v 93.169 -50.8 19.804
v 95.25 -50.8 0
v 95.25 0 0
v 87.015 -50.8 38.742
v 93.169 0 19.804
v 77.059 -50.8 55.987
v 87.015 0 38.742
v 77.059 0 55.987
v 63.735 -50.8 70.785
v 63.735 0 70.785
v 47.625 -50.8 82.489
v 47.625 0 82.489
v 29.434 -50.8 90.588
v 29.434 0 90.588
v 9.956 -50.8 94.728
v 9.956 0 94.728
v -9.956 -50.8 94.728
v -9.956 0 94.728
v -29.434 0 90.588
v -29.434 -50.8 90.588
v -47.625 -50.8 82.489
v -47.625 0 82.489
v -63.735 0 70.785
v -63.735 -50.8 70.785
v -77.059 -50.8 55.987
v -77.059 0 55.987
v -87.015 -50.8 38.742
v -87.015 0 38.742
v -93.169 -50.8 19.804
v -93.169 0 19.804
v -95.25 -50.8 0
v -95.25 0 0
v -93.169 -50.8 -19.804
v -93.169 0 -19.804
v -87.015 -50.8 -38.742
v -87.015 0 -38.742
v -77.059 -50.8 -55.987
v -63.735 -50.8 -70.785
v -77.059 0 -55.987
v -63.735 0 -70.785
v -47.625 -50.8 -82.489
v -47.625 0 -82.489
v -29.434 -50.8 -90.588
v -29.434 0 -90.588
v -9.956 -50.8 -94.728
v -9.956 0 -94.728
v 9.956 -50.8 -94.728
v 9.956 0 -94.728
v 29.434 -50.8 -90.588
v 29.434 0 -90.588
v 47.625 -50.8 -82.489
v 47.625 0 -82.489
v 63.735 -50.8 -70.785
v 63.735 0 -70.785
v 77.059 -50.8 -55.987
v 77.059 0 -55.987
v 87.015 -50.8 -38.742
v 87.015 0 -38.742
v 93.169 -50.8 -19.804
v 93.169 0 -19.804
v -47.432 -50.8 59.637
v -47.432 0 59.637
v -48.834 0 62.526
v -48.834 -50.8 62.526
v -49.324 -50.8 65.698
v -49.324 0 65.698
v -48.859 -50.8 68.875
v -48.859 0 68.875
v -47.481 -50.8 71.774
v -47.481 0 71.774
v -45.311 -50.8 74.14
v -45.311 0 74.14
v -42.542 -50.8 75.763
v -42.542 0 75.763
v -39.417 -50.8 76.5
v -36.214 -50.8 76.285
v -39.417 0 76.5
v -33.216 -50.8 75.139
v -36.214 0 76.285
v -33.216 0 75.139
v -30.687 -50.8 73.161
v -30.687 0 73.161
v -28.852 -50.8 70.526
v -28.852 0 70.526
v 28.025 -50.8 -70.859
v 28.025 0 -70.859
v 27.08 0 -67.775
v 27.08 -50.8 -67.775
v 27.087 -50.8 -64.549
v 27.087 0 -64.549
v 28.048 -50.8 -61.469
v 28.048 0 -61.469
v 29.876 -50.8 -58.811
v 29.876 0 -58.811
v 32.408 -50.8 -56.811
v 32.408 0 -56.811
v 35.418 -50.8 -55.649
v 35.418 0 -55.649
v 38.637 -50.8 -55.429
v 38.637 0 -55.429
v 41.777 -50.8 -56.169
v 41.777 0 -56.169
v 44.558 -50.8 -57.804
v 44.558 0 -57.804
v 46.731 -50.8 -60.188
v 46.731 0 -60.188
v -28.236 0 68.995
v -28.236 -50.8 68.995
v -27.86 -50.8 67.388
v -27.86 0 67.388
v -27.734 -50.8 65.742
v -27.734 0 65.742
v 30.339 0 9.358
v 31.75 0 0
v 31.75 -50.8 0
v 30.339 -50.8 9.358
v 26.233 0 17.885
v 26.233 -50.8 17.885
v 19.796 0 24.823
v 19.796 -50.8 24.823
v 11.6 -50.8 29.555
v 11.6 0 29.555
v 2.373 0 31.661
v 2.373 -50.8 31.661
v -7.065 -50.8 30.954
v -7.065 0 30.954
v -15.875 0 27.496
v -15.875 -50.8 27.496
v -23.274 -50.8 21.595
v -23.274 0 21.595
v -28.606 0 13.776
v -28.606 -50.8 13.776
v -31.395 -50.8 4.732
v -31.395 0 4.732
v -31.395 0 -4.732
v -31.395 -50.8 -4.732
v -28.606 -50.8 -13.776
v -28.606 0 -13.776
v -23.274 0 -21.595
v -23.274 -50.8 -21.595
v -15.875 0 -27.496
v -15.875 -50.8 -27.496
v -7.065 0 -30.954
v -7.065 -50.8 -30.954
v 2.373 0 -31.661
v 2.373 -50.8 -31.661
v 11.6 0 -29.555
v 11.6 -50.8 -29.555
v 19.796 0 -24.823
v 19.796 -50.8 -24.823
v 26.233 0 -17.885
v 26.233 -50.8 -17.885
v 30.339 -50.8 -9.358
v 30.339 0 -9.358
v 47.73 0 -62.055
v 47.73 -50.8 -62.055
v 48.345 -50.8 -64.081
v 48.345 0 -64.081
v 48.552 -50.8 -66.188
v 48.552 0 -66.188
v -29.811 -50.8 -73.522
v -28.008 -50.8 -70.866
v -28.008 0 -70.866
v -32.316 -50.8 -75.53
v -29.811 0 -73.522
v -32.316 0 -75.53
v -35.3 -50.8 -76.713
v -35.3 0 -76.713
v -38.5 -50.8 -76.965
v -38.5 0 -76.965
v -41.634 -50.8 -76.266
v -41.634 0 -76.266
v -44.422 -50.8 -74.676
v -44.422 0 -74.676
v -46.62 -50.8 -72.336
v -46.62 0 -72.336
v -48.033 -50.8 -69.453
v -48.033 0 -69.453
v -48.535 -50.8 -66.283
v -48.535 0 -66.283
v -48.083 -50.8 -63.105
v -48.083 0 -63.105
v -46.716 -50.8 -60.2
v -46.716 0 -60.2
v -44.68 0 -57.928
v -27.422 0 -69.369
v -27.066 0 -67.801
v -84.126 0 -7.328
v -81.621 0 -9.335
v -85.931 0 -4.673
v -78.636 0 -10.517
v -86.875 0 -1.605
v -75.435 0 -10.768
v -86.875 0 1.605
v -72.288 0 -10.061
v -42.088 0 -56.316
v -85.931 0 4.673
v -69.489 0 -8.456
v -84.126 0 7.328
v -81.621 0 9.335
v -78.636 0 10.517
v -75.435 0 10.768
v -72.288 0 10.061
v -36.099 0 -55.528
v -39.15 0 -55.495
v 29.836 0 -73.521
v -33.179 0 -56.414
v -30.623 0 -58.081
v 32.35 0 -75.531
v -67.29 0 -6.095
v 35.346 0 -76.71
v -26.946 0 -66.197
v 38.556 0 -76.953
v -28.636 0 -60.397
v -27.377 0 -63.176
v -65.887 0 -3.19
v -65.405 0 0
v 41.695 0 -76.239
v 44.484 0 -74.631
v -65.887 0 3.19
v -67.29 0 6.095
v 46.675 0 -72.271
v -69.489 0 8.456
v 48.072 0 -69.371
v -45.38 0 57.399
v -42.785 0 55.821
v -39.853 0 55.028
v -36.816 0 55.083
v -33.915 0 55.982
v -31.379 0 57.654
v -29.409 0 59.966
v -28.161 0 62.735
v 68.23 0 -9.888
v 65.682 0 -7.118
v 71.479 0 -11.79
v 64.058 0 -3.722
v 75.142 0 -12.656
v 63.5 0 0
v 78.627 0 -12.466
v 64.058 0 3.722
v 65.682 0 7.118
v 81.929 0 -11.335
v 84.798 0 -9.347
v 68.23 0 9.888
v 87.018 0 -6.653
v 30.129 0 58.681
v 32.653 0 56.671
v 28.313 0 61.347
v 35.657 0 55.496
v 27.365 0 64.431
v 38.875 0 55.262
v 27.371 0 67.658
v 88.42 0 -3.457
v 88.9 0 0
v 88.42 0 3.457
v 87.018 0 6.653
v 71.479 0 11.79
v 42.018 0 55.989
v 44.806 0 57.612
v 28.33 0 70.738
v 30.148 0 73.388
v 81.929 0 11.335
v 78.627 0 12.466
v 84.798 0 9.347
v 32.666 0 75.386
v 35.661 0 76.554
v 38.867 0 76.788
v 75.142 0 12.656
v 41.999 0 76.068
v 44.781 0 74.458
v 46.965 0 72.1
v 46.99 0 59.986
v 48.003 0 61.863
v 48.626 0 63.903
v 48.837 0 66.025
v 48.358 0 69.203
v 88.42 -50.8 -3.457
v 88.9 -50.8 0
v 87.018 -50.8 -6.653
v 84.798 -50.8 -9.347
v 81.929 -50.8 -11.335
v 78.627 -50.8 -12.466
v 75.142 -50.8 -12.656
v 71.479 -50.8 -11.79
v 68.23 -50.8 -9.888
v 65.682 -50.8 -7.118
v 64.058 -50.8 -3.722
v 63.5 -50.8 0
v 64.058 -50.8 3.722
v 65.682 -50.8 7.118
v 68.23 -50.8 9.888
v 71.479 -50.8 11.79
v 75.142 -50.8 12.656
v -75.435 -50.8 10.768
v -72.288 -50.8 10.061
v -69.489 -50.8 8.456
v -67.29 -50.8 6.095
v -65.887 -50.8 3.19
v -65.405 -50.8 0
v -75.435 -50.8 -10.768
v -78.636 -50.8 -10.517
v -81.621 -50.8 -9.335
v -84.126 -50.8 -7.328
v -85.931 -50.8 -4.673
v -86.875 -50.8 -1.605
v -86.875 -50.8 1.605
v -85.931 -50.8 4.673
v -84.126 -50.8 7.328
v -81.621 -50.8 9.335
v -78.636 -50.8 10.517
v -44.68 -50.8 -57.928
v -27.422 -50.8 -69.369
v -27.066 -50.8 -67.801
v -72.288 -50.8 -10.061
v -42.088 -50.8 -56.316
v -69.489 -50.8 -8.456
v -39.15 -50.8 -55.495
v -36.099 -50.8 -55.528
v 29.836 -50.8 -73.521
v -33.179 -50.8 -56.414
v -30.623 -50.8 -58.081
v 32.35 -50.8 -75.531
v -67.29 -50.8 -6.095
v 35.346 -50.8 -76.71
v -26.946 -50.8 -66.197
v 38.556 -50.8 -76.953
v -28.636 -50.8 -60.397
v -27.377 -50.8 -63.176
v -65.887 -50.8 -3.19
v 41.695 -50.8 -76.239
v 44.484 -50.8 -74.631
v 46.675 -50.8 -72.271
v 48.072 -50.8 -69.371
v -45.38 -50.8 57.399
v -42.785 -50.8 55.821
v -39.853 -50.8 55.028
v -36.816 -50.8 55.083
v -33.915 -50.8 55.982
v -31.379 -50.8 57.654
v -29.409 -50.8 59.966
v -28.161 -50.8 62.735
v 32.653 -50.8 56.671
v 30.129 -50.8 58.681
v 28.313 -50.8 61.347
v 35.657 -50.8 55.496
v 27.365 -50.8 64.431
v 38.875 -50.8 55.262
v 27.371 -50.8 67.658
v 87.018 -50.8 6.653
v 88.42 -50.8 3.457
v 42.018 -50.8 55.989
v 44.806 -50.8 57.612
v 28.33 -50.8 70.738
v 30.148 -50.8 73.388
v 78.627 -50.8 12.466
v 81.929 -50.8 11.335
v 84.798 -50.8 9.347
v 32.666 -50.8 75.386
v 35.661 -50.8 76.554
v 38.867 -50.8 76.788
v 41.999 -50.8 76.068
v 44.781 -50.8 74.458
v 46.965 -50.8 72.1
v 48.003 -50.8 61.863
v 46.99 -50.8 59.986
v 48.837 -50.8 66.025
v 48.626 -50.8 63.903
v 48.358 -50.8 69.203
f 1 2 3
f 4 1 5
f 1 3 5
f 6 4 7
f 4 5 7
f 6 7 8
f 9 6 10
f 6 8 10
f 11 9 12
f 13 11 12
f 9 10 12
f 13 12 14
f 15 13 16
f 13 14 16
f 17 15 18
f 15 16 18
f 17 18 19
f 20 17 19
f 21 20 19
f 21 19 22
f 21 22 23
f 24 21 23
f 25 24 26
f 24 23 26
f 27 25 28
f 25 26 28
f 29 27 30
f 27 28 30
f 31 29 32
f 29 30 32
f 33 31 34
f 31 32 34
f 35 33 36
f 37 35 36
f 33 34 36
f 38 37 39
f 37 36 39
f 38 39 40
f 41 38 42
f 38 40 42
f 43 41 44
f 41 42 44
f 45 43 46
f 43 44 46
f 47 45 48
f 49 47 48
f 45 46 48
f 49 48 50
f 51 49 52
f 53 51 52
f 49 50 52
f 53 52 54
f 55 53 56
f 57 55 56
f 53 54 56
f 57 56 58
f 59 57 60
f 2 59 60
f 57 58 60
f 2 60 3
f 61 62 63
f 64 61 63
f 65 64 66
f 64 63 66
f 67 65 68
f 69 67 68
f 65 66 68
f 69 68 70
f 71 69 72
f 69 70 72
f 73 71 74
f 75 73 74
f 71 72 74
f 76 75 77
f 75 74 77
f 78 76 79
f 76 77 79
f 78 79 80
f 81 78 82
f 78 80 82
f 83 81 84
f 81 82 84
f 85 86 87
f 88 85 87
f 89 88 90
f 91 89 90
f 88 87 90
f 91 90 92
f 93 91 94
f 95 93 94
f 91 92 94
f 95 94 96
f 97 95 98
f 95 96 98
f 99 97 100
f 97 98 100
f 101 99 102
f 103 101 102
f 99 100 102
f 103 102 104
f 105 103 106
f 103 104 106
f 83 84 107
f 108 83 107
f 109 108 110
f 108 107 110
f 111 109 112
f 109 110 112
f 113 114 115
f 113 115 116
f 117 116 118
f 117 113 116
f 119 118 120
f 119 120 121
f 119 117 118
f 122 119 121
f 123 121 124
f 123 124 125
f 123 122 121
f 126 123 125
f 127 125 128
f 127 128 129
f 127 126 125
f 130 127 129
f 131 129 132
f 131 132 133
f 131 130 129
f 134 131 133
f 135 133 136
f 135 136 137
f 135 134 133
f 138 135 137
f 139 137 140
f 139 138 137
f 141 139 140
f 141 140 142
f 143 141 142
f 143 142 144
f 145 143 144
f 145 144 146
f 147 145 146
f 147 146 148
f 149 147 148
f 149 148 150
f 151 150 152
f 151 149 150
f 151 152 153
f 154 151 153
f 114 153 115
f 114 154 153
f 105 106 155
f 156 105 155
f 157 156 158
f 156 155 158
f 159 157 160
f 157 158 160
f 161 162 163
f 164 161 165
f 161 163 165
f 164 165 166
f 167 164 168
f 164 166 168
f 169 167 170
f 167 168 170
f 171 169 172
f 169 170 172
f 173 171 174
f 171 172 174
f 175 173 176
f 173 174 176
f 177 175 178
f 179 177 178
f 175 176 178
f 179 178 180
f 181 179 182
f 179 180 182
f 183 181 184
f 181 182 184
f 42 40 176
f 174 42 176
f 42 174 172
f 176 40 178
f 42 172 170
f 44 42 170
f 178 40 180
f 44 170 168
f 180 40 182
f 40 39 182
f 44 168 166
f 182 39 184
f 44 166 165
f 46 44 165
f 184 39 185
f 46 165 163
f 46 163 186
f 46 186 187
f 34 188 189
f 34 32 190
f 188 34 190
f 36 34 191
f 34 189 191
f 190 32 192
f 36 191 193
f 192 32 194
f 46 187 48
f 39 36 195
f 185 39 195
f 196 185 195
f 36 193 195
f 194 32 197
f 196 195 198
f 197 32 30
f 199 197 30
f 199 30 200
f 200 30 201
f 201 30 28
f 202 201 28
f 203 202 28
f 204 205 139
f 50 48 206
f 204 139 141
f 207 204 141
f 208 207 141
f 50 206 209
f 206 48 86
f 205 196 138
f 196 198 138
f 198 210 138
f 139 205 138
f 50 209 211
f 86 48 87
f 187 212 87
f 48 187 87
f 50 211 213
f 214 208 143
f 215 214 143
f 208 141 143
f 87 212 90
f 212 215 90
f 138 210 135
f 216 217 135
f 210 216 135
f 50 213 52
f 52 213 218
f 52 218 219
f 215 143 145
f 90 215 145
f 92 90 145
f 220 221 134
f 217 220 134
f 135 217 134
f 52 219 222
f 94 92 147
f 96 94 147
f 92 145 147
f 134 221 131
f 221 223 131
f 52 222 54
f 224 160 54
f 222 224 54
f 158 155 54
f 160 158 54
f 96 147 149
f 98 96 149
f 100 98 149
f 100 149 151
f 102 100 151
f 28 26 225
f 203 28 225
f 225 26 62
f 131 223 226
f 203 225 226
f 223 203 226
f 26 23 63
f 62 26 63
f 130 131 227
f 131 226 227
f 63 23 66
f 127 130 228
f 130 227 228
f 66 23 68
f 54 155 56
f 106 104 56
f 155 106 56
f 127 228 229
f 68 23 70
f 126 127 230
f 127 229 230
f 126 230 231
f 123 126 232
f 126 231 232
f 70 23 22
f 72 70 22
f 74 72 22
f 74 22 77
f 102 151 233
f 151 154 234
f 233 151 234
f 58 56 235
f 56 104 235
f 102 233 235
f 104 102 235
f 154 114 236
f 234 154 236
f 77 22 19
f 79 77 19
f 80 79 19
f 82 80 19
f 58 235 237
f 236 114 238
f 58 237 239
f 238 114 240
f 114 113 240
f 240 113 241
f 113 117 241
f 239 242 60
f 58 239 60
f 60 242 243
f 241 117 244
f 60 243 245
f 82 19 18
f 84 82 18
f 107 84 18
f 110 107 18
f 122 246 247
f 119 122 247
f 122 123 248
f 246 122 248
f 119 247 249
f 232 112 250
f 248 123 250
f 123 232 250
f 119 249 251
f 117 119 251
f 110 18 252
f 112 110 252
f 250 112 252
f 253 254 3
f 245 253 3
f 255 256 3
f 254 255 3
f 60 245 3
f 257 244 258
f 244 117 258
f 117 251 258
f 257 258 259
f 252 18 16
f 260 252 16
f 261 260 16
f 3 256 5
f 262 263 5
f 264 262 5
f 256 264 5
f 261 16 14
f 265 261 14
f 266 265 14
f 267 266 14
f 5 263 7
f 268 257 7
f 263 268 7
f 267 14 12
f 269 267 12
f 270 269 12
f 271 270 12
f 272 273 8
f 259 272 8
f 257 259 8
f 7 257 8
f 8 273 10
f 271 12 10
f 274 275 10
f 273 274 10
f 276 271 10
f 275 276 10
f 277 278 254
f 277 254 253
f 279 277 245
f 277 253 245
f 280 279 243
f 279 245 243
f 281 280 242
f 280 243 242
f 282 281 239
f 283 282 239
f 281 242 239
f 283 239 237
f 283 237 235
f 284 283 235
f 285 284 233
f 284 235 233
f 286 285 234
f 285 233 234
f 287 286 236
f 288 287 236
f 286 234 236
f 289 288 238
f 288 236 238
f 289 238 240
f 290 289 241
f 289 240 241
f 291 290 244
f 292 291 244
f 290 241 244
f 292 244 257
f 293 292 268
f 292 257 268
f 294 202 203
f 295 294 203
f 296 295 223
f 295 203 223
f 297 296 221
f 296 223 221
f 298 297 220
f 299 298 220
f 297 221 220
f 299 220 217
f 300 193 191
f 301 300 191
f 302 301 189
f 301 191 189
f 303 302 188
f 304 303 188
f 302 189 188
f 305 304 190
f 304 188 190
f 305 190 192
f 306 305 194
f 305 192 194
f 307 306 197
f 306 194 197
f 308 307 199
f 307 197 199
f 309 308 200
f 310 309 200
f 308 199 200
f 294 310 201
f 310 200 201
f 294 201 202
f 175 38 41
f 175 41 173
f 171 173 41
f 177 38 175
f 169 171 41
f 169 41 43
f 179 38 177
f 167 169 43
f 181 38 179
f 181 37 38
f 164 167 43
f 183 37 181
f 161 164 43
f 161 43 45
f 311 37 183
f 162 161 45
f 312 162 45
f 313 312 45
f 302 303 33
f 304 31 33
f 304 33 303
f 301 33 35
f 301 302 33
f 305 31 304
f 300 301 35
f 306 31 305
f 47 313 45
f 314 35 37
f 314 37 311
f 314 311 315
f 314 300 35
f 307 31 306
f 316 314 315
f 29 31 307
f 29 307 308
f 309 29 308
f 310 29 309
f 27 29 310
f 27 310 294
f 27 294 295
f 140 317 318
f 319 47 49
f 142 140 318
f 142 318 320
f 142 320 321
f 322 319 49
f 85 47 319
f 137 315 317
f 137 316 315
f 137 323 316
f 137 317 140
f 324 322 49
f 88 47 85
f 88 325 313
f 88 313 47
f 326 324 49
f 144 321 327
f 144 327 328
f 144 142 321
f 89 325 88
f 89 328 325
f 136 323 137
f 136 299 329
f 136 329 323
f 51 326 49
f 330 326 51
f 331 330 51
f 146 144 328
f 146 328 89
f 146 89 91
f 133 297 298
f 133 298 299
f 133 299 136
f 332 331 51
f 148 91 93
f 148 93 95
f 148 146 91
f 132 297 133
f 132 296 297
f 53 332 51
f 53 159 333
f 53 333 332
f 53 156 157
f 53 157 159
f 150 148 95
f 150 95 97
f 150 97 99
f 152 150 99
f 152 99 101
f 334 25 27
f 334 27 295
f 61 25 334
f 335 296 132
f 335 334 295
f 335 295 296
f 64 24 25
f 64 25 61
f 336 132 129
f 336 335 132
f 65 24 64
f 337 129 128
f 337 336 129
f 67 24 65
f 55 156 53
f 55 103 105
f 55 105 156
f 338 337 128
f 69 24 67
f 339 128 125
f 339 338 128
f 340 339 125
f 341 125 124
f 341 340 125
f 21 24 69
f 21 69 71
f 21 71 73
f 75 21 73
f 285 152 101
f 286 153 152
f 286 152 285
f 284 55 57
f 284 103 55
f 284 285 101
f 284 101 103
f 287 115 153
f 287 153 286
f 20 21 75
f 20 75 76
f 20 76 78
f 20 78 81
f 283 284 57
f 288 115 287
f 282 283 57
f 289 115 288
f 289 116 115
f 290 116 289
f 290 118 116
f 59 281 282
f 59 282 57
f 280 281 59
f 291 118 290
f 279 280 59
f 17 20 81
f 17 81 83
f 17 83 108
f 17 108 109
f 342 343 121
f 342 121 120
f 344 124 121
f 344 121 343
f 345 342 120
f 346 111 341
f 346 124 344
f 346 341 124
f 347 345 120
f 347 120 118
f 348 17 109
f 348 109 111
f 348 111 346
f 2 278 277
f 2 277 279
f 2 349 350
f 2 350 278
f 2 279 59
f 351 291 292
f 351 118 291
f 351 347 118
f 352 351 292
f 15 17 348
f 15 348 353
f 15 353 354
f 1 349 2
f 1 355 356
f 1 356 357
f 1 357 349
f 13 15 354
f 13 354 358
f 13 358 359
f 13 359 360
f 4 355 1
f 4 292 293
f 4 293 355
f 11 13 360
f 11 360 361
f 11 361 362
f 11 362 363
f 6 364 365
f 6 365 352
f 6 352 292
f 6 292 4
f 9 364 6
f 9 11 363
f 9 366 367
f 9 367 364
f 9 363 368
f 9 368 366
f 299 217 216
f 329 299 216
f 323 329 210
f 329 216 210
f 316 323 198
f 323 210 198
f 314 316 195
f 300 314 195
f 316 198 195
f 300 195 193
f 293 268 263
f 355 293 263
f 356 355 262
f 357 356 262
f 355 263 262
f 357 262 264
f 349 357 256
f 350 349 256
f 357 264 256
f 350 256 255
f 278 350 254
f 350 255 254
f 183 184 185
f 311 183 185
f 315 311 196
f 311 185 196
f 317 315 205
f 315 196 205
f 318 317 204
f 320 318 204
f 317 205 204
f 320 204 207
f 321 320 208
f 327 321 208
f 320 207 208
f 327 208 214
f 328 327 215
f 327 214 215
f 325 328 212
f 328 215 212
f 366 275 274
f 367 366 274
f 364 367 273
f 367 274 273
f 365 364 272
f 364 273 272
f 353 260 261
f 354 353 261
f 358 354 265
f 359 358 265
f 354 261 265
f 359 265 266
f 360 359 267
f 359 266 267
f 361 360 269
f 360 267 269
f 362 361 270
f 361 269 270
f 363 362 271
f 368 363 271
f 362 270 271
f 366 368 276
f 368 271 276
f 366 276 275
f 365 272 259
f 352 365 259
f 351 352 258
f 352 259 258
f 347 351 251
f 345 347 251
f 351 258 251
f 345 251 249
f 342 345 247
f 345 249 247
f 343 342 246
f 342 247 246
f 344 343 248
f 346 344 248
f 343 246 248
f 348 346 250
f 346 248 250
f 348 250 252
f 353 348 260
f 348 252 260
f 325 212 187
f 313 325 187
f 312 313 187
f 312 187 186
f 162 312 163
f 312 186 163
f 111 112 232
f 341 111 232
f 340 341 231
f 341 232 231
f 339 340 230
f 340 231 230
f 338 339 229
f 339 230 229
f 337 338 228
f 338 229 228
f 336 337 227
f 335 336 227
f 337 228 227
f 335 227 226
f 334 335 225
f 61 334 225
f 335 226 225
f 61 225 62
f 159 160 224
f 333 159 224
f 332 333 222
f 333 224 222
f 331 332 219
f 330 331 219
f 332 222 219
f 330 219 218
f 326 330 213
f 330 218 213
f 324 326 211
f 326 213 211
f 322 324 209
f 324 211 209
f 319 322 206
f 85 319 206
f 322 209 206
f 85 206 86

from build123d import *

# Parameters (mm, degrees)
F0_R     = 95.25
F0_R_2   = 31.75
F1_DEPTH = 50.8


with BuildPart() as f1:
    # F0 (on Front) → F1 (new body)
    with BuildSketch(Plane.XZ):
        Circle(F0_R)
        with BuildLine():
            ThreePointArc((46.990183, 59.986354), (65.491159, 38.953153), (75.141667, 12.655826))
            ThreePointArc((75.141667, 12.655826), (84.797941, 9.346947), (88.9, 0))
            ThreePointArc((88.9, 0), (84.797941, -9.346947), (75.141667, -12.655826))
            ThreePointArc((75.141667, -12.655826), (65.407135, -39.094076), (46.731427, -60.188153))
            ThreePointArc((46.731427, -60.188153), (48.087021, -63.052889), (48.552253, -66.187838))
            ThreePointArc((48.552253, -66.187838), (40.152635, -76.713719), (28.025311, -70.85917))
            ThreePointArc((28.025311, -70.85917), (0.009492, -76.199999), (-28.007657, -70.86615))
            ThreePointArc((-28.007657, -70.86615), (-43.08737, -75.575185), (-46.716431, -60.199793))
            ThreePointArc((-46.716431, -60.199793), (-65.887351, -38.279198), (-75.435354, -10.767885))
            ThreePointArc((-75.435354, -10.767885), (-86.995, 0), (-75.435354, 10.767885))
            ThreePointArc((-75.435354, 10.767885), (-66.114858, 37.884899), (-47.432359, 59.637332))
            ThreePointArc((-47.432359, 59.637332), (-43.987261, 75.054986), (-28.852362, 70.526458))
            ThreePointArc((-28.852362, 70.526458), (-0.281663, 76.199479), (28.330193, 70.737827))
            ThreePointArc((28.330193, 70.737827), (40.459969, 76.545328), (48.836928, 66.024629))
            ThreePointArc((48.836928, 66.024629), (48.364923, 62.867446), (46.990183, 59.986354))
        make_face(mode=Mode.SUBTRACT)
        with BuildLine():
            ThreePointArc((75.141667, -12.655826), (63.5, 0), (75.141667, 12.655826))
            ThreePointArc((75.141667, 12.655826), (65.491159, 38.953153), (46.990183, 59.986354))
            ThreePointArc((46.990183, 59.986354), (32.652655, 56.67114), (28.330193, 70.737827))
            ThreePointArc((28.330193, 70.737827), (-0.281663, 76.199479), (-28.852362, 70.526458))
            ThreePointArc((-28.852362, 70.526458), (-28.017299, 68.198506), (-27.733988, 65.741593))
            ThreePointArc((-27.733988, 65.741593), (-35.333668, 55.430339), (-47.432359, 59.637332))
            ThreePointArc((-47.432359, 59.637332), (-66.114858, 37.884899), (-75.435354, 10.767885))
            ThreePointArc((-75.435354, 10.767885), (-68.301064, 7.35791), (-65.405, 0))
            ThreePointArc((-65.405, 0), (-68.301064, -7.35791), (-75.435354, -10.767885))
            ThreePointArc((-75.435354, -10.767885), (-65.887351, -38.279198), (-46.716431, -60.199793))
            ThreePointArc((-46.716431, -60.199793), (-34.607099, -55.867083), (-26.945762, -66.197242))
            ThreePointArc((-26.945762, -66.197242), (-27.214583, -68.591314), (-28.007657, -70.86615))
            ThreePointArc((-28.007657, -70.86615), (0.009492, -76.199999), (28.025311, -70.85917))
            ThreePointArc((28.025311, -70.85917), (32.408308, -56.811228), (46.731427, -60.188153))
            ThreePointArc((46.731427, -60.188153), (65.407135, -39.094076), (75.141667, -12.655826))
        make_face()
        Circle(F0_R_2, mode=Mode.SUBTRACT)
    extrude(amount=F1_DEPTH)


solid = f1.part
